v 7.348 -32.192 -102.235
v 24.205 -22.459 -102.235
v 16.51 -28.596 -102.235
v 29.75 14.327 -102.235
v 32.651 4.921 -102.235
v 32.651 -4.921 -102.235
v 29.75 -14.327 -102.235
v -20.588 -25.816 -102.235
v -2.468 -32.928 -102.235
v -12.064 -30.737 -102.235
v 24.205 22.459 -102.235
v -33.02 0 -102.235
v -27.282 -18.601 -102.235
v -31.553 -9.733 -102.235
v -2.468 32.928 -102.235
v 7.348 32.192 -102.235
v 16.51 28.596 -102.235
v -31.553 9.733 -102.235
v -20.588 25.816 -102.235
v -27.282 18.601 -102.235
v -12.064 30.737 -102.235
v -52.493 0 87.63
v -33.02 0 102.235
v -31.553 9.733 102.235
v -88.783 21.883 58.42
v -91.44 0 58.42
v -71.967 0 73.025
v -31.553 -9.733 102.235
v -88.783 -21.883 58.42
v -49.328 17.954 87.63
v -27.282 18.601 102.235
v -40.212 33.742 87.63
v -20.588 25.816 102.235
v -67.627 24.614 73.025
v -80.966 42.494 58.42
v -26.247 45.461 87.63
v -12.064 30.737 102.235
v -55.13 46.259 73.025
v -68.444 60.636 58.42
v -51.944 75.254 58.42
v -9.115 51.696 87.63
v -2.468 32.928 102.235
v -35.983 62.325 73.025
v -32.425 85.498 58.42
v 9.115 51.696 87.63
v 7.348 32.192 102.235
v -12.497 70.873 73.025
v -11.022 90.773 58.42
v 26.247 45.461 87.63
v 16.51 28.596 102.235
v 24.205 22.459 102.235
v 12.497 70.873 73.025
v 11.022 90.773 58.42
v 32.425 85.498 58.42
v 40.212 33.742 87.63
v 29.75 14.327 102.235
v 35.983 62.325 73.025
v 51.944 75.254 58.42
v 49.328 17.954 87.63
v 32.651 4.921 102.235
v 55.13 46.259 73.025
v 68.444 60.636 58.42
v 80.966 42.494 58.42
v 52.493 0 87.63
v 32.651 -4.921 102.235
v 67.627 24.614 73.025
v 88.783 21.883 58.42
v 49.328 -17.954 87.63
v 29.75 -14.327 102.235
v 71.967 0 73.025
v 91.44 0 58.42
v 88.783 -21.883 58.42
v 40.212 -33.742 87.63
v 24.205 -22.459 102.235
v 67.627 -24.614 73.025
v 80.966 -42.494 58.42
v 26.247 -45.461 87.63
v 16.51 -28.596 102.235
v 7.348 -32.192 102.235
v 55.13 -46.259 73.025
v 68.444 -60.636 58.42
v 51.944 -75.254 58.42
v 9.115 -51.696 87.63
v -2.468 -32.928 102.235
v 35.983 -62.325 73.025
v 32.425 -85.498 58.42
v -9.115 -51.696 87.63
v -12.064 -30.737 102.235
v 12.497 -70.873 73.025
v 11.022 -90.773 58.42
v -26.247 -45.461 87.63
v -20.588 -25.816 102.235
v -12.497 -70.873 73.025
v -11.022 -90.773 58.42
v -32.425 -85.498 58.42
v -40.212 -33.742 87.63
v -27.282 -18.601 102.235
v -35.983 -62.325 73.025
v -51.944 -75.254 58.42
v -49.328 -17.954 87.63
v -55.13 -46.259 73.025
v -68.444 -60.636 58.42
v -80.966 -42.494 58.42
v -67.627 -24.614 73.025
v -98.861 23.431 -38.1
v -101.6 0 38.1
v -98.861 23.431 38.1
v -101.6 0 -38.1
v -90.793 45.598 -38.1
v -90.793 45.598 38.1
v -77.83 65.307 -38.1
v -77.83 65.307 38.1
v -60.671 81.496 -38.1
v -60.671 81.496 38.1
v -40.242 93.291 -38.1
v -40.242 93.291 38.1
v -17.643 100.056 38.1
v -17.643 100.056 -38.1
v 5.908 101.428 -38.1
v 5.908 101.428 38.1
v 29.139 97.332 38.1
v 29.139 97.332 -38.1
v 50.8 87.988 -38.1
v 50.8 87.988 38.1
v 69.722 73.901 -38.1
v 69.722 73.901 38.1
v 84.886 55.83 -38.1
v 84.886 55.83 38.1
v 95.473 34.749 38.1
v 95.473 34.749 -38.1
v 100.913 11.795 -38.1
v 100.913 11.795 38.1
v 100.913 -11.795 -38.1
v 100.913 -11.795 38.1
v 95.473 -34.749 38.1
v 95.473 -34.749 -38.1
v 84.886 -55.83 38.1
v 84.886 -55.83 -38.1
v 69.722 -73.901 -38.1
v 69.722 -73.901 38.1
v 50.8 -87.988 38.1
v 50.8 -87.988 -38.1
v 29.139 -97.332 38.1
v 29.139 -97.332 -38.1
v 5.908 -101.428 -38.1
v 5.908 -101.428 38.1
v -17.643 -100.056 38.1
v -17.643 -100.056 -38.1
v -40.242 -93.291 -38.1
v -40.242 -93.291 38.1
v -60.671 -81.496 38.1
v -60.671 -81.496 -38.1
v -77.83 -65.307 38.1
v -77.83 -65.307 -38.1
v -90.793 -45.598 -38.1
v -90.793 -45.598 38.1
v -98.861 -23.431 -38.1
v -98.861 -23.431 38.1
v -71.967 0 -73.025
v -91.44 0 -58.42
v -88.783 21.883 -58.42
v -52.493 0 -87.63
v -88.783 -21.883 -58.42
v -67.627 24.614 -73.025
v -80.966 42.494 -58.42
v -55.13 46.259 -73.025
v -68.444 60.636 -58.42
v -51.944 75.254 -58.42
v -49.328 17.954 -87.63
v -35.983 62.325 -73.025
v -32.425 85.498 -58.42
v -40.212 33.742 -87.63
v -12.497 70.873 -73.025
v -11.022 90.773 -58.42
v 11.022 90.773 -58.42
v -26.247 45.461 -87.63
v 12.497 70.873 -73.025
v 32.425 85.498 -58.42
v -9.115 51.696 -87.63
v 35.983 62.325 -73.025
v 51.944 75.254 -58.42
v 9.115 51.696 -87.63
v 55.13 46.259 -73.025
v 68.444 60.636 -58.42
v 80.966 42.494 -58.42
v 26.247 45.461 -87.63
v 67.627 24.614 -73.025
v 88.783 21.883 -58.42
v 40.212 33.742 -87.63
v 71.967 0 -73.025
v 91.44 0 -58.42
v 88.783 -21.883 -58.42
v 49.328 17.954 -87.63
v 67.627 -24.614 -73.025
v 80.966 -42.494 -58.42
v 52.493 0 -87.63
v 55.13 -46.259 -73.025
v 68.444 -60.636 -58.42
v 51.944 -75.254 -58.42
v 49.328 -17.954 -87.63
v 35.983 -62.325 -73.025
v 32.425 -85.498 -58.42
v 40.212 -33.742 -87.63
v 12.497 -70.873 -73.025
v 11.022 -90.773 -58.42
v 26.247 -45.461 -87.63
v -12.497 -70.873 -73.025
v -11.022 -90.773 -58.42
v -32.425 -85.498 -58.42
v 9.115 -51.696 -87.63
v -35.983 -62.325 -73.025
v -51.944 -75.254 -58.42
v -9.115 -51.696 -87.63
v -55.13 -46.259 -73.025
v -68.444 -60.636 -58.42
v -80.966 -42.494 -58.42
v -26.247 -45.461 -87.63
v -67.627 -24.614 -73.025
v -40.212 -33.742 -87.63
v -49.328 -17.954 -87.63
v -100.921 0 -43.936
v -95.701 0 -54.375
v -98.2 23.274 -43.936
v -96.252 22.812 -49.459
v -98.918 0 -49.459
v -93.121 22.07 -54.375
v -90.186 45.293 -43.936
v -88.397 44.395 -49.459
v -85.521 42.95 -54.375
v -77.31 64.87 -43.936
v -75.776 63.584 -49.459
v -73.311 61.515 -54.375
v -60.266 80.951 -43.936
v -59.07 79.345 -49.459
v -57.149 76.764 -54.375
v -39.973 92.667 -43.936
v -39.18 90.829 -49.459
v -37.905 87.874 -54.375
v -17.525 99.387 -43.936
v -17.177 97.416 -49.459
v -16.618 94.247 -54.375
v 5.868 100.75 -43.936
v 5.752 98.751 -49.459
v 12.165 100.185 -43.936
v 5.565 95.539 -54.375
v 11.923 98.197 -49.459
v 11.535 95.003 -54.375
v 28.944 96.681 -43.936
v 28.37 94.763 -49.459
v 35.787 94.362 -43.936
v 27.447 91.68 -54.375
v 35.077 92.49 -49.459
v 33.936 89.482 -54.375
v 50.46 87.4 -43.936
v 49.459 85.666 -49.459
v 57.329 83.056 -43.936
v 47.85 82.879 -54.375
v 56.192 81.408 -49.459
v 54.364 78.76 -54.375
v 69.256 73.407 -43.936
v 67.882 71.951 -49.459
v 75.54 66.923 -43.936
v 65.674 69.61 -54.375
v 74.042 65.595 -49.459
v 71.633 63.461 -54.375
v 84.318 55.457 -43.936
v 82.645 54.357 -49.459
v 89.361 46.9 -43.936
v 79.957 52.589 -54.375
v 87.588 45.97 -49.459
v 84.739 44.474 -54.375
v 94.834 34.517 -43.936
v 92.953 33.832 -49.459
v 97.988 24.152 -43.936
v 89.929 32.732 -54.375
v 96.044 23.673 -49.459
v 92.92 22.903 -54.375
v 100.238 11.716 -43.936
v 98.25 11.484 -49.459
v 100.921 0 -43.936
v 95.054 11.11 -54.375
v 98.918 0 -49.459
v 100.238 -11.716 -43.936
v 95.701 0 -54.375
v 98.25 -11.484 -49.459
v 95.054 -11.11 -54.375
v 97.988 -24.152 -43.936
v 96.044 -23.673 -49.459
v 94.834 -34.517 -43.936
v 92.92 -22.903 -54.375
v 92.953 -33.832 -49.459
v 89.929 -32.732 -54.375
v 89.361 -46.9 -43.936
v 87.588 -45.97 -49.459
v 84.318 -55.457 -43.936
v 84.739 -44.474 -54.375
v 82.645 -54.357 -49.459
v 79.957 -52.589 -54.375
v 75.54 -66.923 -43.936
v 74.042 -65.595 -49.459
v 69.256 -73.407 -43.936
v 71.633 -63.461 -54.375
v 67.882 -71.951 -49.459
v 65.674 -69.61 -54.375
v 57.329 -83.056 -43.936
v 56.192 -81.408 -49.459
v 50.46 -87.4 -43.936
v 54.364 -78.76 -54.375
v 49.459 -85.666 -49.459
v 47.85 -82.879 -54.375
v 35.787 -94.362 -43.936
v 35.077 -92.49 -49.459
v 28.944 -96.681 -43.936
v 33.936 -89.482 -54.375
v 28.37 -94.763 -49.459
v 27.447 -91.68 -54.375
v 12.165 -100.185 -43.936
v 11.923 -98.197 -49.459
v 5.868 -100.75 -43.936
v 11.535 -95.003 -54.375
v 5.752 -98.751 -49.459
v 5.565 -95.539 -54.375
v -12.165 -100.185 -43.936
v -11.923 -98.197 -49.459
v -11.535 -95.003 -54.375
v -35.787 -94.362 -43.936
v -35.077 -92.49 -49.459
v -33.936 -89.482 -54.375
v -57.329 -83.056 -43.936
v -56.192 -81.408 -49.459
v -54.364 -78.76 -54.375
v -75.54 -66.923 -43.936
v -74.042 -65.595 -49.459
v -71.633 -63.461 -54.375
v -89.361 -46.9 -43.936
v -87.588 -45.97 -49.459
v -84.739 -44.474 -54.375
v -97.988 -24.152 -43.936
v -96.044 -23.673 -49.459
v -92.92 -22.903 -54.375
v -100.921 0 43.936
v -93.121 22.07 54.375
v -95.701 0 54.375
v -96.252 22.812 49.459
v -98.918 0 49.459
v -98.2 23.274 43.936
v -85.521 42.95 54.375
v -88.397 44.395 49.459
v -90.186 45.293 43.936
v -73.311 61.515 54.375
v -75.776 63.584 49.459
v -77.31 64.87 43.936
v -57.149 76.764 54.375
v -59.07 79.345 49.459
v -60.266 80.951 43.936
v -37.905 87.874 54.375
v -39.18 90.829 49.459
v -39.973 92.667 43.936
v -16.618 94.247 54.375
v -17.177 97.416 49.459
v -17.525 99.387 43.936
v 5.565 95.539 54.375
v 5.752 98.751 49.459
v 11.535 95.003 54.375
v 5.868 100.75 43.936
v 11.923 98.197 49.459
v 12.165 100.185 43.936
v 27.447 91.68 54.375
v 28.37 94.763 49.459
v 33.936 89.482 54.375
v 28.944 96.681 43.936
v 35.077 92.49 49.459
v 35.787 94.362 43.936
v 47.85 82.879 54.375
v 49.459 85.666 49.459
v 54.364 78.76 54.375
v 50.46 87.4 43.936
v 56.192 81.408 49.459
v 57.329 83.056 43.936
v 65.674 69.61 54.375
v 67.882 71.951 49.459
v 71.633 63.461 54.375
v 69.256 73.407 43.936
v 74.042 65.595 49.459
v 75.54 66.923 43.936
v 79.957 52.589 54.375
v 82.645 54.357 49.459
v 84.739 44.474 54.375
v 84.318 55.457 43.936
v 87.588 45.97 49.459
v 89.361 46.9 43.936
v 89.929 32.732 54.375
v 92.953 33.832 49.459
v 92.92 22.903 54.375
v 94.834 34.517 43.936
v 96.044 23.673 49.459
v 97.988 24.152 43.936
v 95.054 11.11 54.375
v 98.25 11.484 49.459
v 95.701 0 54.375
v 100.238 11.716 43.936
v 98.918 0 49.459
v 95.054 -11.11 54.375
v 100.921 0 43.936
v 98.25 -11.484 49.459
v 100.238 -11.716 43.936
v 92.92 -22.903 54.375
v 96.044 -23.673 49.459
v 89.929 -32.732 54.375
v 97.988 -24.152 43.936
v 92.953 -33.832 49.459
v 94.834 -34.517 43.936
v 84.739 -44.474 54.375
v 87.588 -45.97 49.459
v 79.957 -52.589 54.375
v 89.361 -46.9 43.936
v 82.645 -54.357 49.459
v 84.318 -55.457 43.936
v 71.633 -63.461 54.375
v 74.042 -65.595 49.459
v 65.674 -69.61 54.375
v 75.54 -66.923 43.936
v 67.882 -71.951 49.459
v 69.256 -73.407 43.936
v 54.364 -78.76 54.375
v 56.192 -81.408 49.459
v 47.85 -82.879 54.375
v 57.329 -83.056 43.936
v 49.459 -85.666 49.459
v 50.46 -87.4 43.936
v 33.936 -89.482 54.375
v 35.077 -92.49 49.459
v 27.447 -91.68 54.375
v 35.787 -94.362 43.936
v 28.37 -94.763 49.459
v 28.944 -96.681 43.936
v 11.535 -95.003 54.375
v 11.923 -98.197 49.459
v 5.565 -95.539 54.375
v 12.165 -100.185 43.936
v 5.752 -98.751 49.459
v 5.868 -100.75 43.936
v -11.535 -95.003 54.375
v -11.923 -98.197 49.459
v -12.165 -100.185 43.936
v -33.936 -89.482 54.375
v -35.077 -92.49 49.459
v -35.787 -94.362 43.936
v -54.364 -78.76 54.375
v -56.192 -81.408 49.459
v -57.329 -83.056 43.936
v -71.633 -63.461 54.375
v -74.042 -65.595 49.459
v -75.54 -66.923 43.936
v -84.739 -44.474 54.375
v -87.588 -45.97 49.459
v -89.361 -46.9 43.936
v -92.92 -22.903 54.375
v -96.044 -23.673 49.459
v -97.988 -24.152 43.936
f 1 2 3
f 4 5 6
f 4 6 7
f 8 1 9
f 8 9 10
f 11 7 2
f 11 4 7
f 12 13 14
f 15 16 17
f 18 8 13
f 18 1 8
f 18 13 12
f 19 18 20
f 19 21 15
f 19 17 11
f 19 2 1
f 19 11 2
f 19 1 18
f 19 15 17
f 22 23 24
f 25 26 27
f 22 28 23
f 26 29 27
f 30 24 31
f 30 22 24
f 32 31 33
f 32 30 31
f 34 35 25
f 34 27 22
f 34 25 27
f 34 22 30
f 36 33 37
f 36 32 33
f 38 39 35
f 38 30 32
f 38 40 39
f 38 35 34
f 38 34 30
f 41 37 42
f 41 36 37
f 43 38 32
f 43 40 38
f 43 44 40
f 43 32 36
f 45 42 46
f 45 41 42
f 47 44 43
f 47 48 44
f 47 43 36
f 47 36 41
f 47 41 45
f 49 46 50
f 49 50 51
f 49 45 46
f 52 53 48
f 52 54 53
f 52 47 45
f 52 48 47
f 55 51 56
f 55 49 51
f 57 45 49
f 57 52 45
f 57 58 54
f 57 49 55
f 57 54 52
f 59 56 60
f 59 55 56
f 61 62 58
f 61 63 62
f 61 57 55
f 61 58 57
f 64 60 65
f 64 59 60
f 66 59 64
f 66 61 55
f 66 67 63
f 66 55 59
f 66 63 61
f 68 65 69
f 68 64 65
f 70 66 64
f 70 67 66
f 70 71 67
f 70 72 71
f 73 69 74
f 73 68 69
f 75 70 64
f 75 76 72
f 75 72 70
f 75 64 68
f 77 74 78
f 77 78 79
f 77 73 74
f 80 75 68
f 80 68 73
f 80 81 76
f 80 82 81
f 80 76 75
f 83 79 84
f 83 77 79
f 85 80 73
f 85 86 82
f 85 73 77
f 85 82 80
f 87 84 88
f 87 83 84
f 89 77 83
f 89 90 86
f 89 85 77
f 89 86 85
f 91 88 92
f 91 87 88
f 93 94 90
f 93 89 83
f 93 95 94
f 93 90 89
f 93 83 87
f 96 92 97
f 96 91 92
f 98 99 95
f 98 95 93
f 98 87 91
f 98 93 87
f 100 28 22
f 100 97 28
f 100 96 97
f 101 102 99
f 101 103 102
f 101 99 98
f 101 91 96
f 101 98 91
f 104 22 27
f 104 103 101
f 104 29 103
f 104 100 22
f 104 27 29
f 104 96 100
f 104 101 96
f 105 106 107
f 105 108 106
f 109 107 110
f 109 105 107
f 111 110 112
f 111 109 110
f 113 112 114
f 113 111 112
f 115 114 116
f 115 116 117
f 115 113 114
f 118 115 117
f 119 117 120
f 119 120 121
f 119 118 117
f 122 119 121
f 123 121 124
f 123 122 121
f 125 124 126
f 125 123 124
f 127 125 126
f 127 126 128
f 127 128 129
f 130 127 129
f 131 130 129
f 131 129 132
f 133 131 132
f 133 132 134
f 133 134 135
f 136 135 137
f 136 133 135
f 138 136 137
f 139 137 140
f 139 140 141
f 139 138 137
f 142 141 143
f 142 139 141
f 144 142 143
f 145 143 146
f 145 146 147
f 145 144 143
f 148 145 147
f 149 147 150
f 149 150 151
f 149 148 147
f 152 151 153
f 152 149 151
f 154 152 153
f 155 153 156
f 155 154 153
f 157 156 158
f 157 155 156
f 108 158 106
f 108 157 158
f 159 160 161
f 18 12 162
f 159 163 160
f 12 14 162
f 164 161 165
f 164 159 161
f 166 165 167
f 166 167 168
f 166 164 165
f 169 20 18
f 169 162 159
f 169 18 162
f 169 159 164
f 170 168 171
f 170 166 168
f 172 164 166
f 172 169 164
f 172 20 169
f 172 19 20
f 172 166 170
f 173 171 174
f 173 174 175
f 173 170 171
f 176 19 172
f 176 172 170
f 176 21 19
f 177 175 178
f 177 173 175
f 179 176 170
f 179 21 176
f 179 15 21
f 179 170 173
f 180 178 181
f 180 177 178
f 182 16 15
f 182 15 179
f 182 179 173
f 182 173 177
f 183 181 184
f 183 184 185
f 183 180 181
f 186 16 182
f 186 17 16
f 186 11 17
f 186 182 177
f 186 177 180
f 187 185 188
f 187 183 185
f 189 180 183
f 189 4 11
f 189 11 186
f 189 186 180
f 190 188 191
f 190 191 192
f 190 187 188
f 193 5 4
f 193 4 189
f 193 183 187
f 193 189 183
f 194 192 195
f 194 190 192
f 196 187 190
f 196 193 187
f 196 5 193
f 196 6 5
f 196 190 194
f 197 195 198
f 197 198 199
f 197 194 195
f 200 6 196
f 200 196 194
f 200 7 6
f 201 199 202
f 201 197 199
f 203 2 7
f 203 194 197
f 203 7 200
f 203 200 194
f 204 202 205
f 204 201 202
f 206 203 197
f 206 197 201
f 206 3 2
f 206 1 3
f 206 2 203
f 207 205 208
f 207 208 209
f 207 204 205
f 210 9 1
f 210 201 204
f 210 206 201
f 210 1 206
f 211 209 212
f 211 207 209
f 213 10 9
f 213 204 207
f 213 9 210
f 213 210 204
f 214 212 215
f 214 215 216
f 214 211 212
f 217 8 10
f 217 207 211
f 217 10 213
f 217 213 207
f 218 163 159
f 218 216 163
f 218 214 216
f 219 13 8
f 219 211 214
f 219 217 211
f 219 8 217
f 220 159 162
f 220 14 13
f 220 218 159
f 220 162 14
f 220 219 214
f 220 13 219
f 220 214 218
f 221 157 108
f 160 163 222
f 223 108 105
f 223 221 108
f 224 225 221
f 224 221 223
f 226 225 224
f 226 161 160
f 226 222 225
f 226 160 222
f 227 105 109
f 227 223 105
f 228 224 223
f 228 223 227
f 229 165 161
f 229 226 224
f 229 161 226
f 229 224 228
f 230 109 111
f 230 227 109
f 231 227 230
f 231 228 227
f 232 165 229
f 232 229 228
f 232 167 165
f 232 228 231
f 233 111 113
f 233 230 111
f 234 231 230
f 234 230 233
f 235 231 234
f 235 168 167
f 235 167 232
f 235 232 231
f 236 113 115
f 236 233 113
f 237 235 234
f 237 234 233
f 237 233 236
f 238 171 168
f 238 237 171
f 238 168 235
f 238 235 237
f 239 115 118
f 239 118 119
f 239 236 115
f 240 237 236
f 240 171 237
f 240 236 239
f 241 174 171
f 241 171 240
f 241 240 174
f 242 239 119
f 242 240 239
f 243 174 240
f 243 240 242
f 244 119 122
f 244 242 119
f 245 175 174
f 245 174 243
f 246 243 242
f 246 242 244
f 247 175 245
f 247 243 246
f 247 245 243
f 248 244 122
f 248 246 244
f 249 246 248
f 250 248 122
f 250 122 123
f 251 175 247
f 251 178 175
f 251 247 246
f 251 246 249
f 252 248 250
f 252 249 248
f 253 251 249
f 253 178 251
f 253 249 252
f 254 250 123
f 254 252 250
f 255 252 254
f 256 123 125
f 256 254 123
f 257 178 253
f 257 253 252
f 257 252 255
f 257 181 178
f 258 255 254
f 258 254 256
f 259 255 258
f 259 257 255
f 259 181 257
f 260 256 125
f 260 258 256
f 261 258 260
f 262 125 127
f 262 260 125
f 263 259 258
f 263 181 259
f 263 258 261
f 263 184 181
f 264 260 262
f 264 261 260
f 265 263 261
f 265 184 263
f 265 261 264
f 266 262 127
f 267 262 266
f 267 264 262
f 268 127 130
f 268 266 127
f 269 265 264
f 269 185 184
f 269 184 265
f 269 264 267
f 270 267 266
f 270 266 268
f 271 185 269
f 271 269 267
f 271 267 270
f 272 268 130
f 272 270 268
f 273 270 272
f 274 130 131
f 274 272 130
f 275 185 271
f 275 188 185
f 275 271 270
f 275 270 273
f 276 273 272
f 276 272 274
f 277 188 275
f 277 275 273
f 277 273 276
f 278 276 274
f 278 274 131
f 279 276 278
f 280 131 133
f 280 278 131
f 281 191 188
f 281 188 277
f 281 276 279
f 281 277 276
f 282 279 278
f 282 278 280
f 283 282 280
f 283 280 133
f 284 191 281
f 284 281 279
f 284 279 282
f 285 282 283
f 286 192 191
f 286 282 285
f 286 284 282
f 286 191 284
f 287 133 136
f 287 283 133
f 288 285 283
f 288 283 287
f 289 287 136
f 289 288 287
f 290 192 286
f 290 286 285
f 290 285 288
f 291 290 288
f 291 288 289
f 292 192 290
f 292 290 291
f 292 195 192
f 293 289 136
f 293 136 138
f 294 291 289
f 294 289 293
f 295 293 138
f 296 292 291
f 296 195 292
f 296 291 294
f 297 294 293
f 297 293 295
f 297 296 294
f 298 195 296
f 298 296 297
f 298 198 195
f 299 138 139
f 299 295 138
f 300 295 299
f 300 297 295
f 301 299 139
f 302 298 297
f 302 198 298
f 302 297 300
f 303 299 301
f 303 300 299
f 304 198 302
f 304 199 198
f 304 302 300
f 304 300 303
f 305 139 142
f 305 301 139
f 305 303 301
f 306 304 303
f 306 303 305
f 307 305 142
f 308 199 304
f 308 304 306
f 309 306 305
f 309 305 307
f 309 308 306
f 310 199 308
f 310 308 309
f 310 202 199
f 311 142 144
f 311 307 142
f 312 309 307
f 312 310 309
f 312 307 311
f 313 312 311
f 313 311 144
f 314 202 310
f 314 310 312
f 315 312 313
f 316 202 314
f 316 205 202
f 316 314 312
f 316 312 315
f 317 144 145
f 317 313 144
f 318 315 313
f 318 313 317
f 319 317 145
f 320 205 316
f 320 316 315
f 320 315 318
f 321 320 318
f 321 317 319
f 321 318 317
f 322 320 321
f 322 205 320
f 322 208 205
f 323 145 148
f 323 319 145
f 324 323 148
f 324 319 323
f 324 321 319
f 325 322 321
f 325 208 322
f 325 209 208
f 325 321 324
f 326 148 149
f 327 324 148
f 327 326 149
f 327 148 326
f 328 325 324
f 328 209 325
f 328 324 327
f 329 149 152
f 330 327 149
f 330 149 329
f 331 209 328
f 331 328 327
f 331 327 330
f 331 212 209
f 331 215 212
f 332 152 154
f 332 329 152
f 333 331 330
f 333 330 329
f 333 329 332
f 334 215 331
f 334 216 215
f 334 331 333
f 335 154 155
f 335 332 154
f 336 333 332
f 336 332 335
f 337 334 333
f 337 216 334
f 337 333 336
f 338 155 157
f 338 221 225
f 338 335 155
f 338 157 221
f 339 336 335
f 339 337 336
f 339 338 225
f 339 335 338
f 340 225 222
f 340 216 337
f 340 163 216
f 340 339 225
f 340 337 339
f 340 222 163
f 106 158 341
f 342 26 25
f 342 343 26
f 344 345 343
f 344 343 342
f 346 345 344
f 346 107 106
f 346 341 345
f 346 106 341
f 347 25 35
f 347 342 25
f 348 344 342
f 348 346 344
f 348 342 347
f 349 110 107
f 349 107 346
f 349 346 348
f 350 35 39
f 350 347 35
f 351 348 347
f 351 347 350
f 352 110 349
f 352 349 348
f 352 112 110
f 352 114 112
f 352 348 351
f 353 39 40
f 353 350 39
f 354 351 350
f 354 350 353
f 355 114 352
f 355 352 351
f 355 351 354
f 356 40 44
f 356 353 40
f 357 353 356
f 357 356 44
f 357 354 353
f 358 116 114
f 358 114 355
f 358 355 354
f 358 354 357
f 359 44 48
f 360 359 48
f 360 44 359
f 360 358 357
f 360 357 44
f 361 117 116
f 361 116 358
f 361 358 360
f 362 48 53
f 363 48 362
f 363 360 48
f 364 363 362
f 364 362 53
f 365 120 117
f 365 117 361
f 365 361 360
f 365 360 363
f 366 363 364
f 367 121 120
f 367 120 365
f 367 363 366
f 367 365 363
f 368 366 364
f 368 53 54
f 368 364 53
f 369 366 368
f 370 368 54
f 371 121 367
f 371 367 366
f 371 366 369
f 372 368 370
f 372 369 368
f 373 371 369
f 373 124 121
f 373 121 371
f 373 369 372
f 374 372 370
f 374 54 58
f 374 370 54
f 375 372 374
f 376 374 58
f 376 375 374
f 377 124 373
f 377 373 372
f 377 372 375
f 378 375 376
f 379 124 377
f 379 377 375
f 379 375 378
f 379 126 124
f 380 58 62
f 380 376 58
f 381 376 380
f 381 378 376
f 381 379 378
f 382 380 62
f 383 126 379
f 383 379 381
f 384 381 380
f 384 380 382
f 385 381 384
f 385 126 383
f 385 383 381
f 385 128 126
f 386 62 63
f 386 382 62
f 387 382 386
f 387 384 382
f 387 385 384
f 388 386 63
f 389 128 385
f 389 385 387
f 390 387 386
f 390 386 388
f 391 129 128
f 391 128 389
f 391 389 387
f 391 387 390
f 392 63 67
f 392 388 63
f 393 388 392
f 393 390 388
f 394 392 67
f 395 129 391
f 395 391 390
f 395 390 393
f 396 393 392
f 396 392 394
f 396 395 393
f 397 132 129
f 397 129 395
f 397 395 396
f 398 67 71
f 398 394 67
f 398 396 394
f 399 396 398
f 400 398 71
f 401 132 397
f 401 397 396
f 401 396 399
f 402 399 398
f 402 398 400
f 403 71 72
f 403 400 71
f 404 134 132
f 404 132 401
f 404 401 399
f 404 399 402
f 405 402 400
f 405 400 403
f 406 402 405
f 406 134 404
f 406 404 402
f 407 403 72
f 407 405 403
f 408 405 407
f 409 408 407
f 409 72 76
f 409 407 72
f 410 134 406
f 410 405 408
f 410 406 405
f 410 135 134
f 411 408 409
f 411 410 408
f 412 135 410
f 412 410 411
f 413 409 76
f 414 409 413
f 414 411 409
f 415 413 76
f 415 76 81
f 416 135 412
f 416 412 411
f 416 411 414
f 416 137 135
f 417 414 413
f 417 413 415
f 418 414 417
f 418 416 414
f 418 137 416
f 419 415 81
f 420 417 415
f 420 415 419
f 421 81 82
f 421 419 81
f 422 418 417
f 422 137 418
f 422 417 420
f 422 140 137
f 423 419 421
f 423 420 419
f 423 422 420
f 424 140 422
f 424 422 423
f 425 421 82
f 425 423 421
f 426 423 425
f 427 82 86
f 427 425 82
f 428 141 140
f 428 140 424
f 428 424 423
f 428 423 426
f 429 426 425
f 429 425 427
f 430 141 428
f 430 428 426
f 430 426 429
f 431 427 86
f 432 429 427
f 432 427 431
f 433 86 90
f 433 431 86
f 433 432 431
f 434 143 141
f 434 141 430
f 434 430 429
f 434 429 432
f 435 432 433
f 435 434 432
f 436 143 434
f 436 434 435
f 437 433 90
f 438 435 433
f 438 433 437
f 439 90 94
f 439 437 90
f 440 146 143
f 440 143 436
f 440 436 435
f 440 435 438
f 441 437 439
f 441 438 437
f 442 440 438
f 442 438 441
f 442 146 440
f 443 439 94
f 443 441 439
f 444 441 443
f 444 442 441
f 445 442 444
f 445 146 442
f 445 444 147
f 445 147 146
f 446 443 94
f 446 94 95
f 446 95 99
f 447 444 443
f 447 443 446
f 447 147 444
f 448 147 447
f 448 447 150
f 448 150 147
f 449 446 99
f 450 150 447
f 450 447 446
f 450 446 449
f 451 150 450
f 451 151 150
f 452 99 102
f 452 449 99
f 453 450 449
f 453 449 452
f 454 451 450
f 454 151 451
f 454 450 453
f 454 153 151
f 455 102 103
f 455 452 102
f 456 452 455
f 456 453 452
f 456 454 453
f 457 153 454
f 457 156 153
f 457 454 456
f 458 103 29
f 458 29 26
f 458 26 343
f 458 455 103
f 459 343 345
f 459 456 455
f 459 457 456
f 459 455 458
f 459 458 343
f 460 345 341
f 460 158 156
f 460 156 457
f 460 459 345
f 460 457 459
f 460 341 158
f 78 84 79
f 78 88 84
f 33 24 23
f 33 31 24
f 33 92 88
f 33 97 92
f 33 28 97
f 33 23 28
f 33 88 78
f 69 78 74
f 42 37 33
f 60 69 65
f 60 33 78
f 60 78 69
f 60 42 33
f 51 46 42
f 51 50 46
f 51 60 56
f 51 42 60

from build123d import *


with BuildPart() as f1:
    # F0 (on Front) → F1 (revolve)
    with BuildSketch(Plane.XZ):
        with BuildLine():
            ThreePointArc((-91.44, 58.42), (-98.918451, 49.459225), (-101.6, 38.1))
            Line((-101.6, 38.1), (-101.6, -38.1))
            ThreePointArc((-101.6, -38.1), (-98.918451, -49.459225), (-91.44, -58.42))
            Line((-91.44, -58.42), (-33.02, -102.235))
            Line((-33.02, -102.235), (0, -102.235))
            Line((0, -102.235), (0, 102.235))
            Line((0, 102.235), (-33.02, 102.235))
            Line((-33.02, 102.235), (-91.44, 58.42))
        make_face()
    revolve(axis=Axis((0, 0, 4.563034), (0, 0, -1)))


solid = f1.part
